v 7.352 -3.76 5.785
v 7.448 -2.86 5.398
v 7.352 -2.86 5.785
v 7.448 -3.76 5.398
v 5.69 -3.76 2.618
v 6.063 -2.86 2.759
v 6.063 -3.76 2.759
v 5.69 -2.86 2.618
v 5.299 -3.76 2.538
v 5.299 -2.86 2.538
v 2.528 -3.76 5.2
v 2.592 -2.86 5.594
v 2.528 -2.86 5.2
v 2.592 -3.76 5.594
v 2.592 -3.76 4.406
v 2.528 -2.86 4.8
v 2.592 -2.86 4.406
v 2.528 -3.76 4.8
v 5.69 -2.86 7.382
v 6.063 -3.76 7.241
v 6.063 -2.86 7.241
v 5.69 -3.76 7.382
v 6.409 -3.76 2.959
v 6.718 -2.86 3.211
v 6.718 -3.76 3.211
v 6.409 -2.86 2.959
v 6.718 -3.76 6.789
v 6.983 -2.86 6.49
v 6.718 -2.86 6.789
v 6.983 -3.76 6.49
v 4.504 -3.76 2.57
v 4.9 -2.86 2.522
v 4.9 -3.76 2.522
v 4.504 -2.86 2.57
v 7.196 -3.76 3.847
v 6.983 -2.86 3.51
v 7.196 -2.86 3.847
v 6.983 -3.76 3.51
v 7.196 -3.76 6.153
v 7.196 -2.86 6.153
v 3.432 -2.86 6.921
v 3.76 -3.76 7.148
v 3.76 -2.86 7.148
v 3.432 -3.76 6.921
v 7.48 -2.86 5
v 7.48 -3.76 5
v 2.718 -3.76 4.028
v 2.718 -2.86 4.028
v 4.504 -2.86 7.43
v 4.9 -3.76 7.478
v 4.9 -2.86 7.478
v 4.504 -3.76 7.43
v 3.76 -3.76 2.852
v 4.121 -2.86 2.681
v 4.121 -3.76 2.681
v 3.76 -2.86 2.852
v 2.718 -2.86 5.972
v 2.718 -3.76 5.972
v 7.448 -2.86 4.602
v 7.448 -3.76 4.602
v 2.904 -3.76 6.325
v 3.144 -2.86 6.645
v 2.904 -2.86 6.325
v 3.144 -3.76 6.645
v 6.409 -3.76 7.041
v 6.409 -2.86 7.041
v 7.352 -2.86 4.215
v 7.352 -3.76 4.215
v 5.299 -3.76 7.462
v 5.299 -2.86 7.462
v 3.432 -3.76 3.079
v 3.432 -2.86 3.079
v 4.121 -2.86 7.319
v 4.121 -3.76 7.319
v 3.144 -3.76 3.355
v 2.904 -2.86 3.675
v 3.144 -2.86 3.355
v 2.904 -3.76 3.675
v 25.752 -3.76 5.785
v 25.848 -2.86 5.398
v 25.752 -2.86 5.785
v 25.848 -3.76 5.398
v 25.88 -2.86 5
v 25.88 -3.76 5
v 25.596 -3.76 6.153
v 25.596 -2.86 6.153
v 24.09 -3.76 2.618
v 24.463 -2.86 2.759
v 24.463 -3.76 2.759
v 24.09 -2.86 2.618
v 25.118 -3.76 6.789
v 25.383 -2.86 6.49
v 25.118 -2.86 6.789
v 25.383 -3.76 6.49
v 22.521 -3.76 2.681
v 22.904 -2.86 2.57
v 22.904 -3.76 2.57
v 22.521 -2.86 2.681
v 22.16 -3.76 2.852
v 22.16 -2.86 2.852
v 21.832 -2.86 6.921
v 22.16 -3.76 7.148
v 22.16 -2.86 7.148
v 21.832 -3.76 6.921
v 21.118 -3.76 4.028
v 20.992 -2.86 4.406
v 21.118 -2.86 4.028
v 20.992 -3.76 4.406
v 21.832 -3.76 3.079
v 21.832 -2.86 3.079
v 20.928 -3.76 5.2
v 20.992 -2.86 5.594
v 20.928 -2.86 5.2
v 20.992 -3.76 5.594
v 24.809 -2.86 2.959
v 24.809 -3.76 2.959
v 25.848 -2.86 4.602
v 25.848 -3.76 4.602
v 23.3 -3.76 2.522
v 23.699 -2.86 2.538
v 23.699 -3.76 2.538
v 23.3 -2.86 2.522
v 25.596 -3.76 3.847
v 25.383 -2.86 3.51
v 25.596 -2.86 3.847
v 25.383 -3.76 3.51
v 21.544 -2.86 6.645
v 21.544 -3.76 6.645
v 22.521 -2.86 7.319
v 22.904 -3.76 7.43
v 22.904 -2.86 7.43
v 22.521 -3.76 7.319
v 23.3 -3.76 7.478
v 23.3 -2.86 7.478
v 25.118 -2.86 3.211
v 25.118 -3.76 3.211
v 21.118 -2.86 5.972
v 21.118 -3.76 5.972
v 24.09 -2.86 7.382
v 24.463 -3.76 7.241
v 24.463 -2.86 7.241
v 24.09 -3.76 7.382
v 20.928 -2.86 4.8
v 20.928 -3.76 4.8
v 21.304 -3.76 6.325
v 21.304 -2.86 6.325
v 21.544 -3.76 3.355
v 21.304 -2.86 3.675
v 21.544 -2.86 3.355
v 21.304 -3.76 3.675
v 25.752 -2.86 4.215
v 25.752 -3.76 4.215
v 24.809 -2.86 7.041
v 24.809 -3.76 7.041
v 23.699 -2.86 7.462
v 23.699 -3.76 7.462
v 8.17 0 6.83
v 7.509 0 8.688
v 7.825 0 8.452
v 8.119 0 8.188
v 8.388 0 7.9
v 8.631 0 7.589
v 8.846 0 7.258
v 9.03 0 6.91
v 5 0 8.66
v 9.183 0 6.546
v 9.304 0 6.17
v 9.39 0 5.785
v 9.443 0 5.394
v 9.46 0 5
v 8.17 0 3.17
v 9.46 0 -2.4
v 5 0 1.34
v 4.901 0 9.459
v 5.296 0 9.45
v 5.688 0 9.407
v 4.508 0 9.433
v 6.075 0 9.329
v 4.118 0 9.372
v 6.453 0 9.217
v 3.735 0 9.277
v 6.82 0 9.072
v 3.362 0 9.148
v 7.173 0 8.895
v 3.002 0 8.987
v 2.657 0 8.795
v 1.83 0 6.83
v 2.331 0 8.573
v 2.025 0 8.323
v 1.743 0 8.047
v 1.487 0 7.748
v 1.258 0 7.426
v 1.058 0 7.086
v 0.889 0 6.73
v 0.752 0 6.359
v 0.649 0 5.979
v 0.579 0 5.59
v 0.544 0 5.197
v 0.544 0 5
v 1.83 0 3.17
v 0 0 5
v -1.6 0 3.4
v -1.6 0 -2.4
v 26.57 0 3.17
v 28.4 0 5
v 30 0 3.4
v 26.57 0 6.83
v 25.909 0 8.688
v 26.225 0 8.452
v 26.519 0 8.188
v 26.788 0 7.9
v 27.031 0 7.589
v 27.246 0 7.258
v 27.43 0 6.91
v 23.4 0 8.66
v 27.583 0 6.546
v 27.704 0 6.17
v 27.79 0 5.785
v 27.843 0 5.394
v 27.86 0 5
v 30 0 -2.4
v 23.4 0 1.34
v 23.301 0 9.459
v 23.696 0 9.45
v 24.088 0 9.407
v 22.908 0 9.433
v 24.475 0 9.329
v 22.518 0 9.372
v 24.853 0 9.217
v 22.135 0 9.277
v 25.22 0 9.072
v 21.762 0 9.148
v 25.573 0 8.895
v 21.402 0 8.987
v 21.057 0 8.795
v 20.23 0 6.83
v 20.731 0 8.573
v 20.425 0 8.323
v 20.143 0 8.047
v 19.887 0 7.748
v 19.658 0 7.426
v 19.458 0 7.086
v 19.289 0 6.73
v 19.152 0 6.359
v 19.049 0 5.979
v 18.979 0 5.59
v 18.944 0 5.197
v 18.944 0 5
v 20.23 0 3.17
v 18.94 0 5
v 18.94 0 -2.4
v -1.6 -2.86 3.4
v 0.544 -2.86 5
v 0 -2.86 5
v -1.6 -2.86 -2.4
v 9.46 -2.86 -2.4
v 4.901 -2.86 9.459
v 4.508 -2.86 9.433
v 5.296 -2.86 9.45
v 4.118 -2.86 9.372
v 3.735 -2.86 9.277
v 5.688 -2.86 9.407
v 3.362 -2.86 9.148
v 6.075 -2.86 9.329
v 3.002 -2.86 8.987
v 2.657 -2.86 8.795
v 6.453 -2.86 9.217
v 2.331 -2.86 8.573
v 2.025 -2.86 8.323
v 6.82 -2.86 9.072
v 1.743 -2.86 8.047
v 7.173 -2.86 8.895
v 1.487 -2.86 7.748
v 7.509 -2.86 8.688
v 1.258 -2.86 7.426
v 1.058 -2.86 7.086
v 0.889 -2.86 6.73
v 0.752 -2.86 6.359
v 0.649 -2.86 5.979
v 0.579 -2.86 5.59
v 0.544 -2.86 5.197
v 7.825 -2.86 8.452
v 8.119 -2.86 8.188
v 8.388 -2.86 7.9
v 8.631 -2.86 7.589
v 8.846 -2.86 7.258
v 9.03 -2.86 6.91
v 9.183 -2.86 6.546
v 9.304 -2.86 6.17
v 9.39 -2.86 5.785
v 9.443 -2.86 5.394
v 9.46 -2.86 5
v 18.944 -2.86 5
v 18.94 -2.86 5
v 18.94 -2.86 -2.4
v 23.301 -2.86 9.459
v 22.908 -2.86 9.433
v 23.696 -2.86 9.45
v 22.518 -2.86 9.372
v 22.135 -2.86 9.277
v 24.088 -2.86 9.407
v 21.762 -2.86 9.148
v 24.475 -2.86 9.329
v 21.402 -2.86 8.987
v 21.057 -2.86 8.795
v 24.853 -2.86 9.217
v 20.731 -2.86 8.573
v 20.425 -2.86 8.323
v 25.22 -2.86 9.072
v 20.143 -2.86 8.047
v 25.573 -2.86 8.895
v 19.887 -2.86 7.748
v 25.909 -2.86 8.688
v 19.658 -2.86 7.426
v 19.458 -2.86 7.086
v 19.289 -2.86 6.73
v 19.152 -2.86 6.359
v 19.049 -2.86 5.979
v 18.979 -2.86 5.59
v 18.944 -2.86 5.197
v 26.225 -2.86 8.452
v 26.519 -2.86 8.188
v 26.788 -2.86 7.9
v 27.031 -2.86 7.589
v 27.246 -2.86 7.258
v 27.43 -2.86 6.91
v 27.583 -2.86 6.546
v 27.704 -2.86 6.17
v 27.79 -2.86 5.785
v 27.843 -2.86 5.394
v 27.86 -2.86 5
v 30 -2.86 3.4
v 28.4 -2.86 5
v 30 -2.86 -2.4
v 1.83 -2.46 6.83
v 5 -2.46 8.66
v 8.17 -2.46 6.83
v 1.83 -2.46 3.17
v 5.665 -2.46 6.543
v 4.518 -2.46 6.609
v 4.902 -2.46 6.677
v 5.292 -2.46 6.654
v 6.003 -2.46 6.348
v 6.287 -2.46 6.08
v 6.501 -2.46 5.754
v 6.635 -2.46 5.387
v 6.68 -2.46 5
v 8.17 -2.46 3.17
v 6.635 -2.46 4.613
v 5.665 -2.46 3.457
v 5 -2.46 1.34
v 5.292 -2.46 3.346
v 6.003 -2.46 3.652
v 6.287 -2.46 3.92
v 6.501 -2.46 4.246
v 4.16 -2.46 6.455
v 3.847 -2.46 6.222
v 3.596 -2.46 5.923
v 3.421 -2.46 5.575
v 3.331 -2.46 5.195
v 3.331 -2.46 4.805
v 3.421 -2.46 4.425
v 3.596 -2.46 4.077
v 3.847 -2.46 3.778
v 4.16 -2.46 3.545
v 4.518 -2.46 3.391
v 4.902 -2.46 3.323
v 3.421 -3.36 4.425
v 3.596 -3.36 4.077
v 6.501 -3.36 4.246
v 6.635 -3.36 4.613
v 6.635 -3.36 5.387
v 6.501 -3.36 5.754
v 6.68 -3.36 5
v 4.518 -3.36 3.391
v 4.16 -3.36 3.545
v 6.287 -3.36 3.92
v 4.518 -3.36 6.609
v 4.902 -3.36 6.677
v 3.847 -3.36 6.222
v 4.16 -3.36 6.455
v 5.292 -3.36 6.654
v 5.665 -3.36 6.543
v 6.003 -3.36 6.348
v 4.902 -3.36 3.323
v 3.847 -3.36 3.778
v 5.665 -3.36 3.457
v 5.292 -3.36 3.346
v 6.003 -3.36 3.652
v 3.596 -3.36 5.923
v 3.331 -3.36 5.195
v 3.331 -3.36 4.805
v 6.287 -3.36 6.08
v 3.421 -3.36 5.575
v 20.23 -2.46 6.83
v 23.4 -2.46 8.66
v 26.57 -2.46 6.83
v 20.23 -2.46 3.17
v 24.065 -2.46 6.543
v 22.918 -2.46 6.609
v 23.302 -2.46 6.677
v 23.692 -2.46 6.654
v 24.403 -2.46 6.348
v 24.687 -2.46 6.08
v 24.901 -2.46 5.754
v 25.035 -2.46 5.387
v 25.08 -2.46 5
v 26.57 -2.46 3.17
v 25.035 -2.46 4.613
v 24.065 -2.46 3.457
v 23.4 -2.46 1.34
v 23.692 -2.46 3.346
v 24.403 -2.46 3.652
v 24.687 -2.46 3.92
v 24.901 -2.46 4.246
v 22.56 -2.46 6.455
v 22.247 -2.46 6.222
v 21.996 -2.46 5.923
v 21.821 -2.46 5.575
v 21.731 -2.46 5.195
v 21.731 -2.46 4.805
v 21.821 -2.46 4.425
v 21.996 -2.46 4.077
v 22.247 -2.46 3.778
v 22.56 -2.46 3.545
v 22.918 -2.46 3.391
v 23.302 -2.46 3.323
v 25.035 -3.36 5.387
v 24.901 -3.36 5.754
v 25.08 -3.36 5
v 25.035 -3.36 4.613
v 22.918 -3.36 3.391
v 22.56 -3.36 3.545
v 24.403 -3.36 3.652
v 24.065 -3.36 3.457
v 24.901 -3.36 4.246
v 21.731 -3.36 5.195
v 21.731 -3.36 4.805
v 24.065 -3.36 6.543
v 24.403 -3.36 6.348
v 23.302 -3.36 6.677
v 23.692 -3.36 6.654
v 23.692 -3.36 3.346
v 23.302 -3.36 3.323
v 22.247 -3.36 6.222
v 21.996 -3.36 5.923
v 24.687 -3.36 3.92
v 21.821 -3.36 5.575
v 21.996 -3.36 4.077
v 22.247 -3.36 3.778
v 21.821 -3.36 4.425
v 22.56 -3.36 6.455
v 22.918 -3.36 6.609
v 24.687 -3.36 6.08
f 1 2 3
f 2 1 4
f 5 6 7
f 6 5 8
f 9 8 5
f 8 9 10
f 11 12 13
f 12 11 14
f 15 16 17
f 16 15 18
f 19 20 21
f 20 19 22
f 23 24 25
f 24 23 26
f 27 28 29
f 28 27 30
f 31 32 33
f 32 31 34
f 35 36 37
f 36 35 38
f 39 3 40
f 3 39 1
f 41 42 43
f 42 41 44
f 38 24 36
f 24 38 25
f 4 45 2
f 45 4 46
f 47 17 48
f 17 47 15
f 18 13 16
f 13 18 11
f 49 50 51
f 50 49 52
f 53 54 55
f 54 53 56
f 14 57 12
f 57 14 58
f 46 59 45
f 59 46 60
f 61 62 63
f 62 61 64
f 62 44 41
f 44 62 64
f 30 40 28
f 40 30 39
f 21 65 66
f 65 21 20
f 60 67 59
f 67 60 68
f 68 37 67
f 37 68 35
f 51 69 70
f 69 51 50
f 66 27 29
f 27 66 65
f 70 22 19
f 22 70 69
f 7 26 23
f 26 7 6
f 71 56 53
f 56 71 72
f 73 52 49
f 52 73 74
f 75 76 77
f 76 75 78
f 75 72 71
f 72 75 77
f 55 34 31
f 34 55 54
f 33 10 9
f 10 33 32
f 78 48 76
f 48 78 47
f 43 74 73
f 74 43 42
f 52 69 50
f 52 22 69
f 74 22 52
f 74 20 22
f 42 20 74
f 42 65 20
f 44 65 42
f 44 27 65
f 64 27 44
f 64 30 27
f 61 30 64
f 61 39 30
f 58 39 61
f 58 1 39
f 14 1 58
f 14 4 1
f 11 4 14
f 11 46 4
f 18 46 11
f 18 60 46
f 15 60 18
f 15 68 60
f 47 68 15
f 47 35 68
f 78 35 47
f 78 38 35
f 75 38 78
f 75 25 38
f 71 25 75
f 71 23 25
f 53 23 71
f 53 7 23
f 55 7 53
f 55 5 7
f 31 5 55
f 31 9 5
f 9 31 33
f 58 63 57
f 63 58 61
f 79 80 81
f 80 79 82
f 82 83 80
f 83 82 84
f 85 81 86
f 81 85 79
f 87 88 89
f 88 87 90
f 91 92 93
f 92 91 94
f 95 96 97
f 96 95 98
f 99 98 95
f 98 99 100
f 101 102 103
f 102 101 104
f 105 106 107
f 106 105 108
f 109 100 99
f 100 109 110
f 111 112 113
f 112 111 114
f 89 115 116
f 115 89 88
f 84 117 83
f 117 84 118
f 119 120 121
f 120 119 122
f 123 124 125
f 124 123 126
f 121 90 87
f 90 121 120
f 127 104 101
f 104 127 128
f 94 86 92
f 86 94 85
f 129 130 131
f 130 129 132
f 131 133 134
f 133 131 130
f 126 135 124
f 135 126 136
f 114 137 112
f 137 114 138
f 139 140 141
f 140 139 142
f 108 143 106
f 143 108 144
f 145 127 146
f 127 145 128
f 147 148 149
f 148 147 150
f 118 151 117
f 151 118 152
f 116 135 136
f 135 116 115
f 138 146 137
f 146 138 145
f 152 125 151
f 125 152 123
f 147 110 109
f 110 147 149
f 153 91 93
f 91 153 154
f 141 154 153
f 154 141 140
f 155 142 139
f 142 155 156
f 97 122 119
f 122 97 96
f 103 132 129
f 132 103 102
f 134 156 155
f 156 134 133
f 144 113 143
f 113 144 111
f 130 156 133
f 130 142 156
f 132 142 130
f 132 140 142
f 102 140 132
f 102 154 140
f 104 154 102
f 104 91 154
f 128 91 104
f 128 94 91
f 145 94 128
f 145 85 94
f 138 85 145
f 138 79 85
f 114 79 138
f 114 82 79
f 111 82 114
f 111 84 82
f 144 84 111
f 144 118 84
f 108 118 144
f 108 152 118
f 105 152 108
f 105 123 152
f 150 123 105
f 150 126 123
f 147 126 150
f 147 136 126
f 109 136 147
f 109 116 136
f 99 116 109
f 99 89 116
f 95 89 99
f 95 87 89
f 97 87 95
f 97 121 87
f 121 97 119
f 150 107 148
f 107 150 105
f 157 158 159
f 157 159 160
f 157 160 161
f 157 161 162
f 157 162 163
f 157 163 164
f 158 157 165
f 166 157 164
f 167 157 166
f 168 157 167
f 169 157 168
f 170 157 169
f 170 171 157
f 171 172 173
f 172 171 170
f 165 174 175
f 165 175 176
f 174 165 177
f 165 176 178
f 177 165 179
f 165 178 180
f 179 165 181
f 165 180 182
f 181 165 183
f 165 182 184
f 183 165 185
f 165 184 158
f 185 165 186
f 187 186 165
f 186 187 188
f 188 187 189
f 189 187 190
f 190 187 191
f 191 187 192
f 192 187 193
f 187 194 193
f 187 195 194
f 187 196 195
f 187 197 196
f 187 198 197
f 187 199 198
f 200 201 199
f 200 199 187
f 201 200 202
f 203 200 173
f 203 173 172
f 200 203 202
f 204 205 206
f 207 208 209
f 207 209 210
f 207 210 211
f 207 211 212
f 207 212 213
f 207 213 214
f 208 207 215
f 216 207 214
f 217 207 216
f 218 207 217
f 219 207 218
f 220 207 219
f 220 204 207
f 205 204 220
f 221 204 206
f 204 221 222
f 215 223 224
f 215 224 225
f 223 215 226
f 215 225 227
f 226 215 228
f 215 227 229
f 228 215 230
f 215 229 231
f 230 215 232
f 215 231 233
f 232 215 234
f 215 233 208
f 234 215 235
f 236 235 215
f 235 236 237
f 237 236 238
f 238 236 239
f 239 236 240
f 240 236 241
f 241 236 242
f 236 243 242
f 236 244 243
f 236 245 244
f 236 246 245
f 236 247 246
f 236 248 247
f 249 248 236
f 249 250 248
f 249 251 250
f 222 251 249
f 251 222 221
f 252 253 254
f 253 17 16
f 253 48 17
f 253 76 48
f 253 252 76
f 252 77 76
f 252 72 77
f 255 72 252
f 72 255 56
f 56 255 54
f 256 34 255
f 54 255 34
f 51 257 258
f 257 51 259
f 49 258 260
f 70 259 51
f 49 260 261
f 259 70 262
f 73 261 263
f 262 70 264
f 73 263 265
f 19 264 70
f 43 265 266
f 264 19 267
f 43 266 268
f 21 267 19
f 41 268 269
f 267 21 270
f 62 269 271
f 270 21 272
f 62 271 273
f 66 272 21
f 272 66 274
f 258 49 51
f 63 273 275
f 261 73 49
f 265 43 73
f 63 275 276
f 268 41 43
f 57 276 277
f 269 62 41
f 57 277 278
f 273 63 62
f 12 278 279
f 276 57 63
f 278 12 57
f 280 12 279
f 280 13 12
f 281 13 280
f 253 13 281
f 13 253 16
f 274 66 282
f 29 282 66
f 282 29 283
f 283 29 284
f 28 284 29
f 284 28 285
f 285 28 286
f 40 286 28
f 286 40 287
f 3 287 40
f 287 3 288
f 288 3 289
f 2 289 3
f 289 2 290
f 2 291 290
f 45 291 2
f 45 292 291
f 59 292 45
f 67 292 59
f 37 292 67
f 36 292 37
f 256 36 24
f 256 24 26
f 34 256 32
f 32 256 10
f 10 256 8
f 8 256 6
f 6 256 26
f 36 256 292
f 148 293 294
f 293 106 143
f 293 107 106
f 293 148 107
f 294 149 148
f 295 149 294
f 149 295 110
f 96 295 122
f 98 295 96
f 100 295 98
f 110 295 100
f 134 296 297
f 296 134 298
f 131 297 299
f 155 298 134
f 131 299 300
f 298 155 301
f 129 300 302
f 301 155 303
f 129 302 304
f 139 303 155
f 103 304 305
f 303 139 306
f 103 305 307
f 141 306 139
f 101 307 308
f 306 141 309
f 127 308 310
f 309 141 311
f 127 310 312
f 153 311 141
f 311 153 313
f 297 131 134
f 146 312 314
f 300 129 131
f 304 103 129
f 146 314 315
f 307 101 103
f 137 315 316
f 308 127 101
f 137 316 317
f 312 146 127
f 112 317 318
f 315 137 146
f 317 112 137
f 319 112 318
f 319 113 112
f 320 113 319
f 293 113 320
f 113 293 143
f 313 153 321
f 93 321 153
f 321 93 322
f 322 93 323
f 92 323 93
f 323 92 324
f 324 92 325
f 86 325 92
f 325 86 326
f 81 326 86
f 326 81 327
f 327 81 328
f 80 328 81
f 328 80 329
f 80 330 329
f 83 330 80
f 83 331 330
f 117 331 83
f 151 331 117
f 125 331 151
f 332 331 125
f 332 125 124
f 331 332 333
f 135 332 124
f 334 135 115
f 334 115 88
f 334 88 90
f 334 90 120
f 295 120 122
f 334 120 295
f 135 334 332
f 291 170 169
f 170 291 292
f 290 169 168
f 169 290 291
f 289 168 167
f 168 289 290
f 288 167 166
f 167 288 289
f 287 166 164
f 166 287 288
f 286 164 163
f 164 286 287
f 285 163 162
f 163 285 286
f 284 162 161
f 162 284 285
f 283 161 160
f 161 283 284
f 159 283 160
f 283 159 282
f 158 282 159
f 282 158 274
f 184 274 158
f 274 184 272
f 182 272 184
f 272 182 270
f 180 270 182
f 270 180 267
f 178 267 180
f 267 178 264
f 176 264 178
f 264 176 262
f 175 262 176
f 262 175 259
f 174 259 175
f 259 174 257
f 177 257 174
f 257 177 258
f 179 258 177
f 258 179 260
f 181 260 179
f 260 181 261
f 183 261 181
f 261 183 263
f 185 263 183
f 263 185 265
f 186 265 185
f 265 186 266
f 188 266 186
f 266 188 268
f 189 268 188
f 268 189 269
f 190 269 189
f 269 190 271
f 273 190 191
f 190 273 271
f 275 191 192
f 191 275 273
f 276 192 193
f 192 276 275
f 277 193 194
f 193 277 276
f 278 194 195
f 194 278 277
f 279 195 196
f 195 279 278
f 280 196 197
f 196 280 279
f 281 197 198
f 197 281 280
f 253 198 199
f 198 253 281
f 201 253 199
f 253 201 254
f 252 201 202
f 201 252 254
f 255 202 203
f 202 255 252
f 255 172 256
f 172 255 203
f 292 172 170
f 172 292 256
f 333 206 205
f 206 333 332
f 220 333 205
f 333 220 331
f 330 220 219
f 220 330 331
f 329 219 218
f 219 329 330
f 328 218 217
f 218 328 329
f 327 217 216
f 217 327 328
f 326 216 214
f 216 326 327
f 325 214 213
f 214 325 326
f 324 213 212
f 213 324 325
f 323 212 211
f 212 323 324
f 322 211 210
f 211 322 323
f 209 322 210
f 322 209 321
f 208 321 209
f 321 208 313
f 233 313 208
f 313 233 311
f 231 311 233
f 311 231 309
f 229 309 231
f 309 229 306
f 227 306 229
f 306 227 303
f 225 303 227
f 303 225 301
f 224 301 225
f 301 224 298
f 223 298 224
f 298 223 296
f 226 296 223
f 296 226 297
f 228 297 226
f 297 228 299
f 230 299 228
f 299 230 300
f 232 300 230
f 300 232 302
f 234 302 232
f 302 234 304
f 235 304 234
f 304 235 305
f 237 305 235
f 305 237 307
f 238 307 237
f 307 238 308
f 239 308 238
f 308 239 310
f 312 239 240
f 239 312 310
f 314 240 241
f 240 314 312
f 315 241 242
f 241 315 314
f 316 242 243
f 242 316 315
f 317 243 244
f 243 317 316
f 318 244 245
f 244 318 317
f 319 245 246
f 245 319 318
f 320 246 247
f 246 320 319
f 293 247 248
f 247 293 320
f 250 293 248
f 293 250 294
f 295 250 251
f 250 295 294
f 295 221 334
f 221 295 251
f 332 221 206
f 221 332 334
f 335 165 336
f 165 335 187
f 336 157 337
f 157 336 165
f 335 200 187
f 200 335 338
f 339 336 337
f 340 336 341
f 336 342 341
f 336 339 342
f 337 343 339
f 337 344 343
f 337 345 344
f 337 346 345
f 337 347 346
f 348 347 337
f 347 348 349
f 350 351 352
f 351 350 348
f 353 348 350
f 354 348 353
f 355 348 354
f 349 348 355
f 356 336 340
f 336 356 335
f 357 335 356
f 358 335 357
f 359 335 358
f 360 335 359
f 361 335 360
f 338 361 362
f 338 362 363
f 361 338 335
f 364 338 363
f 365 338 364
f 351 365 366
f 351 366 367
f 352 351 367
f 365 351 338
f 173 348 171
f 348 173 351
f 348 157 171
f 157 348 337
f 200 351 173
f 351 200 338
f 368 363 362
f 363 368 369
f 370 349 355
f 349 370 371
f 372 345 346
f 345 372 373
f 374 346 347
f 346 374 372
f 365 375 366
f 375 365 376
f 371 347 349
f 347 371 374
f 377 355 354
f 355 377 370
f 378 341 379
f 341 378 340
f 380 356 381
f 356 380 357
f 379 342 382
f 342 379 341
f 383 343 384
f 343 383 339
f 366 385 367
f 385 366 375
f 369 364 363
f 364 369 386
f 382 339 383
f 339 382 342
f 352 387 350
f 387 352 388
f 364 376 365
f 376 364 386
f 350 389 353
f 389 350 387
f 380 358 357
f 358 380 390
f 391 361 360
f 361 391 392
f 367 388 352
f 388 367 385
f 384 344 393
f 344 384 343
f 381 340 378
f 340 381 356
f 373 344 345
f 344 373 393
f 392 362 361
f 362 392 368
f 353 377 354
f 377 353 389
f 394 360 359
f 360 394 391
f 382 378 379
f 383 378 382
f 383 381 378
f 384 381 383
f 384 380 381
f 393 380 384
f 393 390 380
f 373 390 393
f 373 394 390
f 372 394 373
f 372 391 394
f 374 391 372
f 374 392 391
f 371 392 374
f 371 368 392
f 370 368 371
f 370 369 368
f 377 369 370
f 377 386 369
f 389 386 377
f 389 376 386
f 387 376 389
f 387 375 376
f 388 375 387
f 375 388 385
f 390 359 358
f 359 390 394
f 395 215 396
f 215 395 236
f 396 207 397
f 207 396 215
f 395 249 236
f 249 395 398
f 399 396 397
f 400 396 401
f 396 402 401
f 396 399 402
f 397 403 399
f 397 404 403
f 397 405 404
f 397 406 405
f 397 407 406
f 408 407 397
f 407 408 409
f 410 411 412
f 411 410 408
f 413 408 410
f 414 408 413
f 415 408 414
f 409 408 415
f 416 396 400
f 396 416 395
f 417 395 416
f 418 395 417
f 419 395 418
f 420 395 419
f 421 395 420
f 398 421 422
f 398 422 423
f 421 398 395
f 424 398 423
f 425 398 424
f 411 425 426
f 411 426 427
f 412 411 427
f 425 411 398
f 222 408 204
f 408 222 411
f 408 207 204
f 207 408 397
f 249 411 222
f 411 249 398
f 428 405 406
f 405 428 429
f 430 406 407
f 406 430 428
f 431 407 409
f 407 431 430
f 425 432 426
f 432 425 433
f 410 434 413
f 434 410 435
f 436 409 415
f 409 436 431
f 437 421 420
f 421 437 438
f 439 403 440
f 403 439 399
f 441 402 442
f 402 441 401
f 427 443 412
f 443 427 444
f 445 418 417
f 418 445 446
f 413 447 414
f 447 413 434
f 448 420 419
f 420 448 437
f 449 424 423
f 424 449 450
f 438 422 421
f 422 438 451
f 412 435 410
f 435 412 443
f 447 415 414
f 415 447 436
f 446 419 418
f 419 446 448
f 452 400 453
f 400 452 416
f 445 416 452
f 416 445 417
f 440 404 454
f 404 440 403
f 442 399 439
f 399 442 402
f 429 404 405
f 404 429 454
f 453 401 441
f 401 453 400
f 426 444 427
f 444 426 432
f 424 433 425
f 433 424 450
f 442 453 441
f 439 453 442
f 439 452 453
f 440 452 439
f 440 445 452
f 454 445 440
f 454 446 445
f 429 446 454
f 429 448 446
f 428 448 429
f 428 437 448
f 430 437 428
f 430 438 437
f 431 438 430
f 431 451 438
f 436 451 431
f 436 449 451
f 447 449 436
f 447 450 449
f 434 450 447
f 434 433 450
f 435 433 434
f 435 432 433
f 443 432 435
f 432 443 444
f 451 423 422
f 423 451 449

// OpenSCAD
// Copyright (C) 2025 Arif K. Rafiq
// This program is free software: you can redistribute it and/or modify
// it under the terms of the GNU General Public License as published by
// the Free Software Foundation, either version 3 of the License, or
// (at your option) any later version.

// This program is distributed in the hope that it will be useful,
// but WITHOUT ANY WARRANTY; without even the implied warranty of
// MERCHANTABILITY or FITNESS FOR A PARTICULAR PURPOSE.  See the
// GNU General Public License for more details.

// You should have received a copy of the GNU General Public License
// along with this file.  If not, see <https://www.gnu.org/licenses/>,
// or write to: license@temperedoptimism.com


/* 
(b)readth       :(w)est (X-)   (c)enter (X0) (e)east (X+)
(h)eight        :(d)own (Z-)   (g)round(Z0)  (u)p (Z+)

Vectors (v)     :(x), (y), (z)
Thicknesses (t) : Thicknesses to resolve 3D printer limits or rendering issues.
Proportion (p)  : container for grouping (r)adius and (i)ntensity into a singl 2d vector acccessed using .x and .y respectively
*/
/* 17:08 */
// Fixed in example3.scad       // Set limits in customizer
/* [Thicknesses (x),(y),(z)] */
tFitGap = [0.16, 0.16, 0.16];   //[0.00:0.01:0.64] 
tWallMin = [0.40, 0.40, 0.16];  //[0.16:0.08:1.60] 
/* [Proportional (x):(Radius, (y):(i)ntensity] */
pHexSink = [3.5, 2.3];          //[0.10:0.02:20.00] 
pFastShaft = [1.36, 5.80]; //0.10:0.02:20.00]
pWashSink = [4.00, 1.00]; //0.10:0.02:20.00]
/* [2D vectors (x), (y)] */
vTerminalW = [5.0, 5.0];        //[0.00:0.10:100] 
vTerminalE = [23.4, 5.0];       //[0.00:0.10:100] 
/* [Scalars] */
leadingEdge = 2.4; //[0.8:0.4:5.0]
flankEdge = 1.6; //[0.8:0.4:5.0]
bBoard = 28.4; //[20:0.1:100.0]
hBoard = 1.6; //0.8:04:3.2]
/* [Special ] */
fa0 = 4.0;     //[1:1:60]  
fs0 = 0.4;     //[0.1:0.1:4.0]  
fx0 = 3;       //[1,2,3,4,5,6,7,8,9,10]
rCorner = 1.6; //0.1
/* [Hidden] */ 
tEps=0.01; 

/* Calucualted at run time. */
pHexSurround = [pHexSink.x + (tWallMin.x * 2) + tFitGap.x, pHexSink.y + tWallMin.y + tFitGap.y];
pExtension = [pFastShaft.x + ((tWallMin.x + tFitGap.x)* 2), pFastShaft.y + tWallMin.y + tFitGap.y - pHexSurround.y -hBoard - pWashSink.y];

//30.00-35.00 Circles, Also look at the customizer!!
// Rotate
rotate([90,0,0]){
  difference(){
    union() {
      // hex pocket surround
      linear_extrude(pHexSurround.y, convexity=fx0){ 
        polygon([[vTerminalW.x + pHexSurround.x, vTerminalW.y],
              [ vTerminalW.x + pHexSurround.x, -leadingEdge],
              [-flankEdge, -leadingEdge],
              [-flankEdge, vTerminalW.y - rCorner],
              [-flankEdge + rCorner, vTerminalW.y]]);
        polygon([[vTerminalE.x - pHexSurround.x, vTerminalE.y],
              [ vTerminalE.x - pHexSurround.x, -leadingEdge],
              [bBoard + flankEdge, -leadingEdge],
              [bBoard + flankEdge, vTerminalE.y - rCorner],
              [bBoard + flankEdge - rCorner, vTerminalE.y]]);       
              
        for(v = [vTerminalW, vTerminalE]){
          translate(v)  circle(pHexSurround.x, $fa=fa0, $fs=fs0 );
        }
      }
      // shaft extension
      for(v= [vTerminalW, vTerminalE]){
          translate([v.x, v.y, pHexSurround.y - tEps]) cylinder(pExtension.y + tEps, r=pExtension.x, $fa=fa0, $fs=fs0);
      }
    }
    //hex pocket
    // Solve Conflicting bodies
    // This could be a loop see: 16:05 in the Video:
    //  https://www.youtube.com/watch?v=R-gRqGRss1k   
    for(v = [vTerminalW, vTerminalE]){
        // hex pocket
        #translate([v.x, v.y, -tEps]) rotate([0,0,30]) cylinder(pHexSurround.y - tWallMin.y + tEps, r=pHexSurround.x - (tWallMin.x * 2), $fn=6);
        // fastner hole
        #translate([v.x, v.y, -hBoard -pWashSink.y]) cylinder(pFastShaft.y + tFitGap.y, r=pFastShaft.x + (tFitGap.x * 2), $fa=fa0, $fs=fs0);
    }
  }
}
